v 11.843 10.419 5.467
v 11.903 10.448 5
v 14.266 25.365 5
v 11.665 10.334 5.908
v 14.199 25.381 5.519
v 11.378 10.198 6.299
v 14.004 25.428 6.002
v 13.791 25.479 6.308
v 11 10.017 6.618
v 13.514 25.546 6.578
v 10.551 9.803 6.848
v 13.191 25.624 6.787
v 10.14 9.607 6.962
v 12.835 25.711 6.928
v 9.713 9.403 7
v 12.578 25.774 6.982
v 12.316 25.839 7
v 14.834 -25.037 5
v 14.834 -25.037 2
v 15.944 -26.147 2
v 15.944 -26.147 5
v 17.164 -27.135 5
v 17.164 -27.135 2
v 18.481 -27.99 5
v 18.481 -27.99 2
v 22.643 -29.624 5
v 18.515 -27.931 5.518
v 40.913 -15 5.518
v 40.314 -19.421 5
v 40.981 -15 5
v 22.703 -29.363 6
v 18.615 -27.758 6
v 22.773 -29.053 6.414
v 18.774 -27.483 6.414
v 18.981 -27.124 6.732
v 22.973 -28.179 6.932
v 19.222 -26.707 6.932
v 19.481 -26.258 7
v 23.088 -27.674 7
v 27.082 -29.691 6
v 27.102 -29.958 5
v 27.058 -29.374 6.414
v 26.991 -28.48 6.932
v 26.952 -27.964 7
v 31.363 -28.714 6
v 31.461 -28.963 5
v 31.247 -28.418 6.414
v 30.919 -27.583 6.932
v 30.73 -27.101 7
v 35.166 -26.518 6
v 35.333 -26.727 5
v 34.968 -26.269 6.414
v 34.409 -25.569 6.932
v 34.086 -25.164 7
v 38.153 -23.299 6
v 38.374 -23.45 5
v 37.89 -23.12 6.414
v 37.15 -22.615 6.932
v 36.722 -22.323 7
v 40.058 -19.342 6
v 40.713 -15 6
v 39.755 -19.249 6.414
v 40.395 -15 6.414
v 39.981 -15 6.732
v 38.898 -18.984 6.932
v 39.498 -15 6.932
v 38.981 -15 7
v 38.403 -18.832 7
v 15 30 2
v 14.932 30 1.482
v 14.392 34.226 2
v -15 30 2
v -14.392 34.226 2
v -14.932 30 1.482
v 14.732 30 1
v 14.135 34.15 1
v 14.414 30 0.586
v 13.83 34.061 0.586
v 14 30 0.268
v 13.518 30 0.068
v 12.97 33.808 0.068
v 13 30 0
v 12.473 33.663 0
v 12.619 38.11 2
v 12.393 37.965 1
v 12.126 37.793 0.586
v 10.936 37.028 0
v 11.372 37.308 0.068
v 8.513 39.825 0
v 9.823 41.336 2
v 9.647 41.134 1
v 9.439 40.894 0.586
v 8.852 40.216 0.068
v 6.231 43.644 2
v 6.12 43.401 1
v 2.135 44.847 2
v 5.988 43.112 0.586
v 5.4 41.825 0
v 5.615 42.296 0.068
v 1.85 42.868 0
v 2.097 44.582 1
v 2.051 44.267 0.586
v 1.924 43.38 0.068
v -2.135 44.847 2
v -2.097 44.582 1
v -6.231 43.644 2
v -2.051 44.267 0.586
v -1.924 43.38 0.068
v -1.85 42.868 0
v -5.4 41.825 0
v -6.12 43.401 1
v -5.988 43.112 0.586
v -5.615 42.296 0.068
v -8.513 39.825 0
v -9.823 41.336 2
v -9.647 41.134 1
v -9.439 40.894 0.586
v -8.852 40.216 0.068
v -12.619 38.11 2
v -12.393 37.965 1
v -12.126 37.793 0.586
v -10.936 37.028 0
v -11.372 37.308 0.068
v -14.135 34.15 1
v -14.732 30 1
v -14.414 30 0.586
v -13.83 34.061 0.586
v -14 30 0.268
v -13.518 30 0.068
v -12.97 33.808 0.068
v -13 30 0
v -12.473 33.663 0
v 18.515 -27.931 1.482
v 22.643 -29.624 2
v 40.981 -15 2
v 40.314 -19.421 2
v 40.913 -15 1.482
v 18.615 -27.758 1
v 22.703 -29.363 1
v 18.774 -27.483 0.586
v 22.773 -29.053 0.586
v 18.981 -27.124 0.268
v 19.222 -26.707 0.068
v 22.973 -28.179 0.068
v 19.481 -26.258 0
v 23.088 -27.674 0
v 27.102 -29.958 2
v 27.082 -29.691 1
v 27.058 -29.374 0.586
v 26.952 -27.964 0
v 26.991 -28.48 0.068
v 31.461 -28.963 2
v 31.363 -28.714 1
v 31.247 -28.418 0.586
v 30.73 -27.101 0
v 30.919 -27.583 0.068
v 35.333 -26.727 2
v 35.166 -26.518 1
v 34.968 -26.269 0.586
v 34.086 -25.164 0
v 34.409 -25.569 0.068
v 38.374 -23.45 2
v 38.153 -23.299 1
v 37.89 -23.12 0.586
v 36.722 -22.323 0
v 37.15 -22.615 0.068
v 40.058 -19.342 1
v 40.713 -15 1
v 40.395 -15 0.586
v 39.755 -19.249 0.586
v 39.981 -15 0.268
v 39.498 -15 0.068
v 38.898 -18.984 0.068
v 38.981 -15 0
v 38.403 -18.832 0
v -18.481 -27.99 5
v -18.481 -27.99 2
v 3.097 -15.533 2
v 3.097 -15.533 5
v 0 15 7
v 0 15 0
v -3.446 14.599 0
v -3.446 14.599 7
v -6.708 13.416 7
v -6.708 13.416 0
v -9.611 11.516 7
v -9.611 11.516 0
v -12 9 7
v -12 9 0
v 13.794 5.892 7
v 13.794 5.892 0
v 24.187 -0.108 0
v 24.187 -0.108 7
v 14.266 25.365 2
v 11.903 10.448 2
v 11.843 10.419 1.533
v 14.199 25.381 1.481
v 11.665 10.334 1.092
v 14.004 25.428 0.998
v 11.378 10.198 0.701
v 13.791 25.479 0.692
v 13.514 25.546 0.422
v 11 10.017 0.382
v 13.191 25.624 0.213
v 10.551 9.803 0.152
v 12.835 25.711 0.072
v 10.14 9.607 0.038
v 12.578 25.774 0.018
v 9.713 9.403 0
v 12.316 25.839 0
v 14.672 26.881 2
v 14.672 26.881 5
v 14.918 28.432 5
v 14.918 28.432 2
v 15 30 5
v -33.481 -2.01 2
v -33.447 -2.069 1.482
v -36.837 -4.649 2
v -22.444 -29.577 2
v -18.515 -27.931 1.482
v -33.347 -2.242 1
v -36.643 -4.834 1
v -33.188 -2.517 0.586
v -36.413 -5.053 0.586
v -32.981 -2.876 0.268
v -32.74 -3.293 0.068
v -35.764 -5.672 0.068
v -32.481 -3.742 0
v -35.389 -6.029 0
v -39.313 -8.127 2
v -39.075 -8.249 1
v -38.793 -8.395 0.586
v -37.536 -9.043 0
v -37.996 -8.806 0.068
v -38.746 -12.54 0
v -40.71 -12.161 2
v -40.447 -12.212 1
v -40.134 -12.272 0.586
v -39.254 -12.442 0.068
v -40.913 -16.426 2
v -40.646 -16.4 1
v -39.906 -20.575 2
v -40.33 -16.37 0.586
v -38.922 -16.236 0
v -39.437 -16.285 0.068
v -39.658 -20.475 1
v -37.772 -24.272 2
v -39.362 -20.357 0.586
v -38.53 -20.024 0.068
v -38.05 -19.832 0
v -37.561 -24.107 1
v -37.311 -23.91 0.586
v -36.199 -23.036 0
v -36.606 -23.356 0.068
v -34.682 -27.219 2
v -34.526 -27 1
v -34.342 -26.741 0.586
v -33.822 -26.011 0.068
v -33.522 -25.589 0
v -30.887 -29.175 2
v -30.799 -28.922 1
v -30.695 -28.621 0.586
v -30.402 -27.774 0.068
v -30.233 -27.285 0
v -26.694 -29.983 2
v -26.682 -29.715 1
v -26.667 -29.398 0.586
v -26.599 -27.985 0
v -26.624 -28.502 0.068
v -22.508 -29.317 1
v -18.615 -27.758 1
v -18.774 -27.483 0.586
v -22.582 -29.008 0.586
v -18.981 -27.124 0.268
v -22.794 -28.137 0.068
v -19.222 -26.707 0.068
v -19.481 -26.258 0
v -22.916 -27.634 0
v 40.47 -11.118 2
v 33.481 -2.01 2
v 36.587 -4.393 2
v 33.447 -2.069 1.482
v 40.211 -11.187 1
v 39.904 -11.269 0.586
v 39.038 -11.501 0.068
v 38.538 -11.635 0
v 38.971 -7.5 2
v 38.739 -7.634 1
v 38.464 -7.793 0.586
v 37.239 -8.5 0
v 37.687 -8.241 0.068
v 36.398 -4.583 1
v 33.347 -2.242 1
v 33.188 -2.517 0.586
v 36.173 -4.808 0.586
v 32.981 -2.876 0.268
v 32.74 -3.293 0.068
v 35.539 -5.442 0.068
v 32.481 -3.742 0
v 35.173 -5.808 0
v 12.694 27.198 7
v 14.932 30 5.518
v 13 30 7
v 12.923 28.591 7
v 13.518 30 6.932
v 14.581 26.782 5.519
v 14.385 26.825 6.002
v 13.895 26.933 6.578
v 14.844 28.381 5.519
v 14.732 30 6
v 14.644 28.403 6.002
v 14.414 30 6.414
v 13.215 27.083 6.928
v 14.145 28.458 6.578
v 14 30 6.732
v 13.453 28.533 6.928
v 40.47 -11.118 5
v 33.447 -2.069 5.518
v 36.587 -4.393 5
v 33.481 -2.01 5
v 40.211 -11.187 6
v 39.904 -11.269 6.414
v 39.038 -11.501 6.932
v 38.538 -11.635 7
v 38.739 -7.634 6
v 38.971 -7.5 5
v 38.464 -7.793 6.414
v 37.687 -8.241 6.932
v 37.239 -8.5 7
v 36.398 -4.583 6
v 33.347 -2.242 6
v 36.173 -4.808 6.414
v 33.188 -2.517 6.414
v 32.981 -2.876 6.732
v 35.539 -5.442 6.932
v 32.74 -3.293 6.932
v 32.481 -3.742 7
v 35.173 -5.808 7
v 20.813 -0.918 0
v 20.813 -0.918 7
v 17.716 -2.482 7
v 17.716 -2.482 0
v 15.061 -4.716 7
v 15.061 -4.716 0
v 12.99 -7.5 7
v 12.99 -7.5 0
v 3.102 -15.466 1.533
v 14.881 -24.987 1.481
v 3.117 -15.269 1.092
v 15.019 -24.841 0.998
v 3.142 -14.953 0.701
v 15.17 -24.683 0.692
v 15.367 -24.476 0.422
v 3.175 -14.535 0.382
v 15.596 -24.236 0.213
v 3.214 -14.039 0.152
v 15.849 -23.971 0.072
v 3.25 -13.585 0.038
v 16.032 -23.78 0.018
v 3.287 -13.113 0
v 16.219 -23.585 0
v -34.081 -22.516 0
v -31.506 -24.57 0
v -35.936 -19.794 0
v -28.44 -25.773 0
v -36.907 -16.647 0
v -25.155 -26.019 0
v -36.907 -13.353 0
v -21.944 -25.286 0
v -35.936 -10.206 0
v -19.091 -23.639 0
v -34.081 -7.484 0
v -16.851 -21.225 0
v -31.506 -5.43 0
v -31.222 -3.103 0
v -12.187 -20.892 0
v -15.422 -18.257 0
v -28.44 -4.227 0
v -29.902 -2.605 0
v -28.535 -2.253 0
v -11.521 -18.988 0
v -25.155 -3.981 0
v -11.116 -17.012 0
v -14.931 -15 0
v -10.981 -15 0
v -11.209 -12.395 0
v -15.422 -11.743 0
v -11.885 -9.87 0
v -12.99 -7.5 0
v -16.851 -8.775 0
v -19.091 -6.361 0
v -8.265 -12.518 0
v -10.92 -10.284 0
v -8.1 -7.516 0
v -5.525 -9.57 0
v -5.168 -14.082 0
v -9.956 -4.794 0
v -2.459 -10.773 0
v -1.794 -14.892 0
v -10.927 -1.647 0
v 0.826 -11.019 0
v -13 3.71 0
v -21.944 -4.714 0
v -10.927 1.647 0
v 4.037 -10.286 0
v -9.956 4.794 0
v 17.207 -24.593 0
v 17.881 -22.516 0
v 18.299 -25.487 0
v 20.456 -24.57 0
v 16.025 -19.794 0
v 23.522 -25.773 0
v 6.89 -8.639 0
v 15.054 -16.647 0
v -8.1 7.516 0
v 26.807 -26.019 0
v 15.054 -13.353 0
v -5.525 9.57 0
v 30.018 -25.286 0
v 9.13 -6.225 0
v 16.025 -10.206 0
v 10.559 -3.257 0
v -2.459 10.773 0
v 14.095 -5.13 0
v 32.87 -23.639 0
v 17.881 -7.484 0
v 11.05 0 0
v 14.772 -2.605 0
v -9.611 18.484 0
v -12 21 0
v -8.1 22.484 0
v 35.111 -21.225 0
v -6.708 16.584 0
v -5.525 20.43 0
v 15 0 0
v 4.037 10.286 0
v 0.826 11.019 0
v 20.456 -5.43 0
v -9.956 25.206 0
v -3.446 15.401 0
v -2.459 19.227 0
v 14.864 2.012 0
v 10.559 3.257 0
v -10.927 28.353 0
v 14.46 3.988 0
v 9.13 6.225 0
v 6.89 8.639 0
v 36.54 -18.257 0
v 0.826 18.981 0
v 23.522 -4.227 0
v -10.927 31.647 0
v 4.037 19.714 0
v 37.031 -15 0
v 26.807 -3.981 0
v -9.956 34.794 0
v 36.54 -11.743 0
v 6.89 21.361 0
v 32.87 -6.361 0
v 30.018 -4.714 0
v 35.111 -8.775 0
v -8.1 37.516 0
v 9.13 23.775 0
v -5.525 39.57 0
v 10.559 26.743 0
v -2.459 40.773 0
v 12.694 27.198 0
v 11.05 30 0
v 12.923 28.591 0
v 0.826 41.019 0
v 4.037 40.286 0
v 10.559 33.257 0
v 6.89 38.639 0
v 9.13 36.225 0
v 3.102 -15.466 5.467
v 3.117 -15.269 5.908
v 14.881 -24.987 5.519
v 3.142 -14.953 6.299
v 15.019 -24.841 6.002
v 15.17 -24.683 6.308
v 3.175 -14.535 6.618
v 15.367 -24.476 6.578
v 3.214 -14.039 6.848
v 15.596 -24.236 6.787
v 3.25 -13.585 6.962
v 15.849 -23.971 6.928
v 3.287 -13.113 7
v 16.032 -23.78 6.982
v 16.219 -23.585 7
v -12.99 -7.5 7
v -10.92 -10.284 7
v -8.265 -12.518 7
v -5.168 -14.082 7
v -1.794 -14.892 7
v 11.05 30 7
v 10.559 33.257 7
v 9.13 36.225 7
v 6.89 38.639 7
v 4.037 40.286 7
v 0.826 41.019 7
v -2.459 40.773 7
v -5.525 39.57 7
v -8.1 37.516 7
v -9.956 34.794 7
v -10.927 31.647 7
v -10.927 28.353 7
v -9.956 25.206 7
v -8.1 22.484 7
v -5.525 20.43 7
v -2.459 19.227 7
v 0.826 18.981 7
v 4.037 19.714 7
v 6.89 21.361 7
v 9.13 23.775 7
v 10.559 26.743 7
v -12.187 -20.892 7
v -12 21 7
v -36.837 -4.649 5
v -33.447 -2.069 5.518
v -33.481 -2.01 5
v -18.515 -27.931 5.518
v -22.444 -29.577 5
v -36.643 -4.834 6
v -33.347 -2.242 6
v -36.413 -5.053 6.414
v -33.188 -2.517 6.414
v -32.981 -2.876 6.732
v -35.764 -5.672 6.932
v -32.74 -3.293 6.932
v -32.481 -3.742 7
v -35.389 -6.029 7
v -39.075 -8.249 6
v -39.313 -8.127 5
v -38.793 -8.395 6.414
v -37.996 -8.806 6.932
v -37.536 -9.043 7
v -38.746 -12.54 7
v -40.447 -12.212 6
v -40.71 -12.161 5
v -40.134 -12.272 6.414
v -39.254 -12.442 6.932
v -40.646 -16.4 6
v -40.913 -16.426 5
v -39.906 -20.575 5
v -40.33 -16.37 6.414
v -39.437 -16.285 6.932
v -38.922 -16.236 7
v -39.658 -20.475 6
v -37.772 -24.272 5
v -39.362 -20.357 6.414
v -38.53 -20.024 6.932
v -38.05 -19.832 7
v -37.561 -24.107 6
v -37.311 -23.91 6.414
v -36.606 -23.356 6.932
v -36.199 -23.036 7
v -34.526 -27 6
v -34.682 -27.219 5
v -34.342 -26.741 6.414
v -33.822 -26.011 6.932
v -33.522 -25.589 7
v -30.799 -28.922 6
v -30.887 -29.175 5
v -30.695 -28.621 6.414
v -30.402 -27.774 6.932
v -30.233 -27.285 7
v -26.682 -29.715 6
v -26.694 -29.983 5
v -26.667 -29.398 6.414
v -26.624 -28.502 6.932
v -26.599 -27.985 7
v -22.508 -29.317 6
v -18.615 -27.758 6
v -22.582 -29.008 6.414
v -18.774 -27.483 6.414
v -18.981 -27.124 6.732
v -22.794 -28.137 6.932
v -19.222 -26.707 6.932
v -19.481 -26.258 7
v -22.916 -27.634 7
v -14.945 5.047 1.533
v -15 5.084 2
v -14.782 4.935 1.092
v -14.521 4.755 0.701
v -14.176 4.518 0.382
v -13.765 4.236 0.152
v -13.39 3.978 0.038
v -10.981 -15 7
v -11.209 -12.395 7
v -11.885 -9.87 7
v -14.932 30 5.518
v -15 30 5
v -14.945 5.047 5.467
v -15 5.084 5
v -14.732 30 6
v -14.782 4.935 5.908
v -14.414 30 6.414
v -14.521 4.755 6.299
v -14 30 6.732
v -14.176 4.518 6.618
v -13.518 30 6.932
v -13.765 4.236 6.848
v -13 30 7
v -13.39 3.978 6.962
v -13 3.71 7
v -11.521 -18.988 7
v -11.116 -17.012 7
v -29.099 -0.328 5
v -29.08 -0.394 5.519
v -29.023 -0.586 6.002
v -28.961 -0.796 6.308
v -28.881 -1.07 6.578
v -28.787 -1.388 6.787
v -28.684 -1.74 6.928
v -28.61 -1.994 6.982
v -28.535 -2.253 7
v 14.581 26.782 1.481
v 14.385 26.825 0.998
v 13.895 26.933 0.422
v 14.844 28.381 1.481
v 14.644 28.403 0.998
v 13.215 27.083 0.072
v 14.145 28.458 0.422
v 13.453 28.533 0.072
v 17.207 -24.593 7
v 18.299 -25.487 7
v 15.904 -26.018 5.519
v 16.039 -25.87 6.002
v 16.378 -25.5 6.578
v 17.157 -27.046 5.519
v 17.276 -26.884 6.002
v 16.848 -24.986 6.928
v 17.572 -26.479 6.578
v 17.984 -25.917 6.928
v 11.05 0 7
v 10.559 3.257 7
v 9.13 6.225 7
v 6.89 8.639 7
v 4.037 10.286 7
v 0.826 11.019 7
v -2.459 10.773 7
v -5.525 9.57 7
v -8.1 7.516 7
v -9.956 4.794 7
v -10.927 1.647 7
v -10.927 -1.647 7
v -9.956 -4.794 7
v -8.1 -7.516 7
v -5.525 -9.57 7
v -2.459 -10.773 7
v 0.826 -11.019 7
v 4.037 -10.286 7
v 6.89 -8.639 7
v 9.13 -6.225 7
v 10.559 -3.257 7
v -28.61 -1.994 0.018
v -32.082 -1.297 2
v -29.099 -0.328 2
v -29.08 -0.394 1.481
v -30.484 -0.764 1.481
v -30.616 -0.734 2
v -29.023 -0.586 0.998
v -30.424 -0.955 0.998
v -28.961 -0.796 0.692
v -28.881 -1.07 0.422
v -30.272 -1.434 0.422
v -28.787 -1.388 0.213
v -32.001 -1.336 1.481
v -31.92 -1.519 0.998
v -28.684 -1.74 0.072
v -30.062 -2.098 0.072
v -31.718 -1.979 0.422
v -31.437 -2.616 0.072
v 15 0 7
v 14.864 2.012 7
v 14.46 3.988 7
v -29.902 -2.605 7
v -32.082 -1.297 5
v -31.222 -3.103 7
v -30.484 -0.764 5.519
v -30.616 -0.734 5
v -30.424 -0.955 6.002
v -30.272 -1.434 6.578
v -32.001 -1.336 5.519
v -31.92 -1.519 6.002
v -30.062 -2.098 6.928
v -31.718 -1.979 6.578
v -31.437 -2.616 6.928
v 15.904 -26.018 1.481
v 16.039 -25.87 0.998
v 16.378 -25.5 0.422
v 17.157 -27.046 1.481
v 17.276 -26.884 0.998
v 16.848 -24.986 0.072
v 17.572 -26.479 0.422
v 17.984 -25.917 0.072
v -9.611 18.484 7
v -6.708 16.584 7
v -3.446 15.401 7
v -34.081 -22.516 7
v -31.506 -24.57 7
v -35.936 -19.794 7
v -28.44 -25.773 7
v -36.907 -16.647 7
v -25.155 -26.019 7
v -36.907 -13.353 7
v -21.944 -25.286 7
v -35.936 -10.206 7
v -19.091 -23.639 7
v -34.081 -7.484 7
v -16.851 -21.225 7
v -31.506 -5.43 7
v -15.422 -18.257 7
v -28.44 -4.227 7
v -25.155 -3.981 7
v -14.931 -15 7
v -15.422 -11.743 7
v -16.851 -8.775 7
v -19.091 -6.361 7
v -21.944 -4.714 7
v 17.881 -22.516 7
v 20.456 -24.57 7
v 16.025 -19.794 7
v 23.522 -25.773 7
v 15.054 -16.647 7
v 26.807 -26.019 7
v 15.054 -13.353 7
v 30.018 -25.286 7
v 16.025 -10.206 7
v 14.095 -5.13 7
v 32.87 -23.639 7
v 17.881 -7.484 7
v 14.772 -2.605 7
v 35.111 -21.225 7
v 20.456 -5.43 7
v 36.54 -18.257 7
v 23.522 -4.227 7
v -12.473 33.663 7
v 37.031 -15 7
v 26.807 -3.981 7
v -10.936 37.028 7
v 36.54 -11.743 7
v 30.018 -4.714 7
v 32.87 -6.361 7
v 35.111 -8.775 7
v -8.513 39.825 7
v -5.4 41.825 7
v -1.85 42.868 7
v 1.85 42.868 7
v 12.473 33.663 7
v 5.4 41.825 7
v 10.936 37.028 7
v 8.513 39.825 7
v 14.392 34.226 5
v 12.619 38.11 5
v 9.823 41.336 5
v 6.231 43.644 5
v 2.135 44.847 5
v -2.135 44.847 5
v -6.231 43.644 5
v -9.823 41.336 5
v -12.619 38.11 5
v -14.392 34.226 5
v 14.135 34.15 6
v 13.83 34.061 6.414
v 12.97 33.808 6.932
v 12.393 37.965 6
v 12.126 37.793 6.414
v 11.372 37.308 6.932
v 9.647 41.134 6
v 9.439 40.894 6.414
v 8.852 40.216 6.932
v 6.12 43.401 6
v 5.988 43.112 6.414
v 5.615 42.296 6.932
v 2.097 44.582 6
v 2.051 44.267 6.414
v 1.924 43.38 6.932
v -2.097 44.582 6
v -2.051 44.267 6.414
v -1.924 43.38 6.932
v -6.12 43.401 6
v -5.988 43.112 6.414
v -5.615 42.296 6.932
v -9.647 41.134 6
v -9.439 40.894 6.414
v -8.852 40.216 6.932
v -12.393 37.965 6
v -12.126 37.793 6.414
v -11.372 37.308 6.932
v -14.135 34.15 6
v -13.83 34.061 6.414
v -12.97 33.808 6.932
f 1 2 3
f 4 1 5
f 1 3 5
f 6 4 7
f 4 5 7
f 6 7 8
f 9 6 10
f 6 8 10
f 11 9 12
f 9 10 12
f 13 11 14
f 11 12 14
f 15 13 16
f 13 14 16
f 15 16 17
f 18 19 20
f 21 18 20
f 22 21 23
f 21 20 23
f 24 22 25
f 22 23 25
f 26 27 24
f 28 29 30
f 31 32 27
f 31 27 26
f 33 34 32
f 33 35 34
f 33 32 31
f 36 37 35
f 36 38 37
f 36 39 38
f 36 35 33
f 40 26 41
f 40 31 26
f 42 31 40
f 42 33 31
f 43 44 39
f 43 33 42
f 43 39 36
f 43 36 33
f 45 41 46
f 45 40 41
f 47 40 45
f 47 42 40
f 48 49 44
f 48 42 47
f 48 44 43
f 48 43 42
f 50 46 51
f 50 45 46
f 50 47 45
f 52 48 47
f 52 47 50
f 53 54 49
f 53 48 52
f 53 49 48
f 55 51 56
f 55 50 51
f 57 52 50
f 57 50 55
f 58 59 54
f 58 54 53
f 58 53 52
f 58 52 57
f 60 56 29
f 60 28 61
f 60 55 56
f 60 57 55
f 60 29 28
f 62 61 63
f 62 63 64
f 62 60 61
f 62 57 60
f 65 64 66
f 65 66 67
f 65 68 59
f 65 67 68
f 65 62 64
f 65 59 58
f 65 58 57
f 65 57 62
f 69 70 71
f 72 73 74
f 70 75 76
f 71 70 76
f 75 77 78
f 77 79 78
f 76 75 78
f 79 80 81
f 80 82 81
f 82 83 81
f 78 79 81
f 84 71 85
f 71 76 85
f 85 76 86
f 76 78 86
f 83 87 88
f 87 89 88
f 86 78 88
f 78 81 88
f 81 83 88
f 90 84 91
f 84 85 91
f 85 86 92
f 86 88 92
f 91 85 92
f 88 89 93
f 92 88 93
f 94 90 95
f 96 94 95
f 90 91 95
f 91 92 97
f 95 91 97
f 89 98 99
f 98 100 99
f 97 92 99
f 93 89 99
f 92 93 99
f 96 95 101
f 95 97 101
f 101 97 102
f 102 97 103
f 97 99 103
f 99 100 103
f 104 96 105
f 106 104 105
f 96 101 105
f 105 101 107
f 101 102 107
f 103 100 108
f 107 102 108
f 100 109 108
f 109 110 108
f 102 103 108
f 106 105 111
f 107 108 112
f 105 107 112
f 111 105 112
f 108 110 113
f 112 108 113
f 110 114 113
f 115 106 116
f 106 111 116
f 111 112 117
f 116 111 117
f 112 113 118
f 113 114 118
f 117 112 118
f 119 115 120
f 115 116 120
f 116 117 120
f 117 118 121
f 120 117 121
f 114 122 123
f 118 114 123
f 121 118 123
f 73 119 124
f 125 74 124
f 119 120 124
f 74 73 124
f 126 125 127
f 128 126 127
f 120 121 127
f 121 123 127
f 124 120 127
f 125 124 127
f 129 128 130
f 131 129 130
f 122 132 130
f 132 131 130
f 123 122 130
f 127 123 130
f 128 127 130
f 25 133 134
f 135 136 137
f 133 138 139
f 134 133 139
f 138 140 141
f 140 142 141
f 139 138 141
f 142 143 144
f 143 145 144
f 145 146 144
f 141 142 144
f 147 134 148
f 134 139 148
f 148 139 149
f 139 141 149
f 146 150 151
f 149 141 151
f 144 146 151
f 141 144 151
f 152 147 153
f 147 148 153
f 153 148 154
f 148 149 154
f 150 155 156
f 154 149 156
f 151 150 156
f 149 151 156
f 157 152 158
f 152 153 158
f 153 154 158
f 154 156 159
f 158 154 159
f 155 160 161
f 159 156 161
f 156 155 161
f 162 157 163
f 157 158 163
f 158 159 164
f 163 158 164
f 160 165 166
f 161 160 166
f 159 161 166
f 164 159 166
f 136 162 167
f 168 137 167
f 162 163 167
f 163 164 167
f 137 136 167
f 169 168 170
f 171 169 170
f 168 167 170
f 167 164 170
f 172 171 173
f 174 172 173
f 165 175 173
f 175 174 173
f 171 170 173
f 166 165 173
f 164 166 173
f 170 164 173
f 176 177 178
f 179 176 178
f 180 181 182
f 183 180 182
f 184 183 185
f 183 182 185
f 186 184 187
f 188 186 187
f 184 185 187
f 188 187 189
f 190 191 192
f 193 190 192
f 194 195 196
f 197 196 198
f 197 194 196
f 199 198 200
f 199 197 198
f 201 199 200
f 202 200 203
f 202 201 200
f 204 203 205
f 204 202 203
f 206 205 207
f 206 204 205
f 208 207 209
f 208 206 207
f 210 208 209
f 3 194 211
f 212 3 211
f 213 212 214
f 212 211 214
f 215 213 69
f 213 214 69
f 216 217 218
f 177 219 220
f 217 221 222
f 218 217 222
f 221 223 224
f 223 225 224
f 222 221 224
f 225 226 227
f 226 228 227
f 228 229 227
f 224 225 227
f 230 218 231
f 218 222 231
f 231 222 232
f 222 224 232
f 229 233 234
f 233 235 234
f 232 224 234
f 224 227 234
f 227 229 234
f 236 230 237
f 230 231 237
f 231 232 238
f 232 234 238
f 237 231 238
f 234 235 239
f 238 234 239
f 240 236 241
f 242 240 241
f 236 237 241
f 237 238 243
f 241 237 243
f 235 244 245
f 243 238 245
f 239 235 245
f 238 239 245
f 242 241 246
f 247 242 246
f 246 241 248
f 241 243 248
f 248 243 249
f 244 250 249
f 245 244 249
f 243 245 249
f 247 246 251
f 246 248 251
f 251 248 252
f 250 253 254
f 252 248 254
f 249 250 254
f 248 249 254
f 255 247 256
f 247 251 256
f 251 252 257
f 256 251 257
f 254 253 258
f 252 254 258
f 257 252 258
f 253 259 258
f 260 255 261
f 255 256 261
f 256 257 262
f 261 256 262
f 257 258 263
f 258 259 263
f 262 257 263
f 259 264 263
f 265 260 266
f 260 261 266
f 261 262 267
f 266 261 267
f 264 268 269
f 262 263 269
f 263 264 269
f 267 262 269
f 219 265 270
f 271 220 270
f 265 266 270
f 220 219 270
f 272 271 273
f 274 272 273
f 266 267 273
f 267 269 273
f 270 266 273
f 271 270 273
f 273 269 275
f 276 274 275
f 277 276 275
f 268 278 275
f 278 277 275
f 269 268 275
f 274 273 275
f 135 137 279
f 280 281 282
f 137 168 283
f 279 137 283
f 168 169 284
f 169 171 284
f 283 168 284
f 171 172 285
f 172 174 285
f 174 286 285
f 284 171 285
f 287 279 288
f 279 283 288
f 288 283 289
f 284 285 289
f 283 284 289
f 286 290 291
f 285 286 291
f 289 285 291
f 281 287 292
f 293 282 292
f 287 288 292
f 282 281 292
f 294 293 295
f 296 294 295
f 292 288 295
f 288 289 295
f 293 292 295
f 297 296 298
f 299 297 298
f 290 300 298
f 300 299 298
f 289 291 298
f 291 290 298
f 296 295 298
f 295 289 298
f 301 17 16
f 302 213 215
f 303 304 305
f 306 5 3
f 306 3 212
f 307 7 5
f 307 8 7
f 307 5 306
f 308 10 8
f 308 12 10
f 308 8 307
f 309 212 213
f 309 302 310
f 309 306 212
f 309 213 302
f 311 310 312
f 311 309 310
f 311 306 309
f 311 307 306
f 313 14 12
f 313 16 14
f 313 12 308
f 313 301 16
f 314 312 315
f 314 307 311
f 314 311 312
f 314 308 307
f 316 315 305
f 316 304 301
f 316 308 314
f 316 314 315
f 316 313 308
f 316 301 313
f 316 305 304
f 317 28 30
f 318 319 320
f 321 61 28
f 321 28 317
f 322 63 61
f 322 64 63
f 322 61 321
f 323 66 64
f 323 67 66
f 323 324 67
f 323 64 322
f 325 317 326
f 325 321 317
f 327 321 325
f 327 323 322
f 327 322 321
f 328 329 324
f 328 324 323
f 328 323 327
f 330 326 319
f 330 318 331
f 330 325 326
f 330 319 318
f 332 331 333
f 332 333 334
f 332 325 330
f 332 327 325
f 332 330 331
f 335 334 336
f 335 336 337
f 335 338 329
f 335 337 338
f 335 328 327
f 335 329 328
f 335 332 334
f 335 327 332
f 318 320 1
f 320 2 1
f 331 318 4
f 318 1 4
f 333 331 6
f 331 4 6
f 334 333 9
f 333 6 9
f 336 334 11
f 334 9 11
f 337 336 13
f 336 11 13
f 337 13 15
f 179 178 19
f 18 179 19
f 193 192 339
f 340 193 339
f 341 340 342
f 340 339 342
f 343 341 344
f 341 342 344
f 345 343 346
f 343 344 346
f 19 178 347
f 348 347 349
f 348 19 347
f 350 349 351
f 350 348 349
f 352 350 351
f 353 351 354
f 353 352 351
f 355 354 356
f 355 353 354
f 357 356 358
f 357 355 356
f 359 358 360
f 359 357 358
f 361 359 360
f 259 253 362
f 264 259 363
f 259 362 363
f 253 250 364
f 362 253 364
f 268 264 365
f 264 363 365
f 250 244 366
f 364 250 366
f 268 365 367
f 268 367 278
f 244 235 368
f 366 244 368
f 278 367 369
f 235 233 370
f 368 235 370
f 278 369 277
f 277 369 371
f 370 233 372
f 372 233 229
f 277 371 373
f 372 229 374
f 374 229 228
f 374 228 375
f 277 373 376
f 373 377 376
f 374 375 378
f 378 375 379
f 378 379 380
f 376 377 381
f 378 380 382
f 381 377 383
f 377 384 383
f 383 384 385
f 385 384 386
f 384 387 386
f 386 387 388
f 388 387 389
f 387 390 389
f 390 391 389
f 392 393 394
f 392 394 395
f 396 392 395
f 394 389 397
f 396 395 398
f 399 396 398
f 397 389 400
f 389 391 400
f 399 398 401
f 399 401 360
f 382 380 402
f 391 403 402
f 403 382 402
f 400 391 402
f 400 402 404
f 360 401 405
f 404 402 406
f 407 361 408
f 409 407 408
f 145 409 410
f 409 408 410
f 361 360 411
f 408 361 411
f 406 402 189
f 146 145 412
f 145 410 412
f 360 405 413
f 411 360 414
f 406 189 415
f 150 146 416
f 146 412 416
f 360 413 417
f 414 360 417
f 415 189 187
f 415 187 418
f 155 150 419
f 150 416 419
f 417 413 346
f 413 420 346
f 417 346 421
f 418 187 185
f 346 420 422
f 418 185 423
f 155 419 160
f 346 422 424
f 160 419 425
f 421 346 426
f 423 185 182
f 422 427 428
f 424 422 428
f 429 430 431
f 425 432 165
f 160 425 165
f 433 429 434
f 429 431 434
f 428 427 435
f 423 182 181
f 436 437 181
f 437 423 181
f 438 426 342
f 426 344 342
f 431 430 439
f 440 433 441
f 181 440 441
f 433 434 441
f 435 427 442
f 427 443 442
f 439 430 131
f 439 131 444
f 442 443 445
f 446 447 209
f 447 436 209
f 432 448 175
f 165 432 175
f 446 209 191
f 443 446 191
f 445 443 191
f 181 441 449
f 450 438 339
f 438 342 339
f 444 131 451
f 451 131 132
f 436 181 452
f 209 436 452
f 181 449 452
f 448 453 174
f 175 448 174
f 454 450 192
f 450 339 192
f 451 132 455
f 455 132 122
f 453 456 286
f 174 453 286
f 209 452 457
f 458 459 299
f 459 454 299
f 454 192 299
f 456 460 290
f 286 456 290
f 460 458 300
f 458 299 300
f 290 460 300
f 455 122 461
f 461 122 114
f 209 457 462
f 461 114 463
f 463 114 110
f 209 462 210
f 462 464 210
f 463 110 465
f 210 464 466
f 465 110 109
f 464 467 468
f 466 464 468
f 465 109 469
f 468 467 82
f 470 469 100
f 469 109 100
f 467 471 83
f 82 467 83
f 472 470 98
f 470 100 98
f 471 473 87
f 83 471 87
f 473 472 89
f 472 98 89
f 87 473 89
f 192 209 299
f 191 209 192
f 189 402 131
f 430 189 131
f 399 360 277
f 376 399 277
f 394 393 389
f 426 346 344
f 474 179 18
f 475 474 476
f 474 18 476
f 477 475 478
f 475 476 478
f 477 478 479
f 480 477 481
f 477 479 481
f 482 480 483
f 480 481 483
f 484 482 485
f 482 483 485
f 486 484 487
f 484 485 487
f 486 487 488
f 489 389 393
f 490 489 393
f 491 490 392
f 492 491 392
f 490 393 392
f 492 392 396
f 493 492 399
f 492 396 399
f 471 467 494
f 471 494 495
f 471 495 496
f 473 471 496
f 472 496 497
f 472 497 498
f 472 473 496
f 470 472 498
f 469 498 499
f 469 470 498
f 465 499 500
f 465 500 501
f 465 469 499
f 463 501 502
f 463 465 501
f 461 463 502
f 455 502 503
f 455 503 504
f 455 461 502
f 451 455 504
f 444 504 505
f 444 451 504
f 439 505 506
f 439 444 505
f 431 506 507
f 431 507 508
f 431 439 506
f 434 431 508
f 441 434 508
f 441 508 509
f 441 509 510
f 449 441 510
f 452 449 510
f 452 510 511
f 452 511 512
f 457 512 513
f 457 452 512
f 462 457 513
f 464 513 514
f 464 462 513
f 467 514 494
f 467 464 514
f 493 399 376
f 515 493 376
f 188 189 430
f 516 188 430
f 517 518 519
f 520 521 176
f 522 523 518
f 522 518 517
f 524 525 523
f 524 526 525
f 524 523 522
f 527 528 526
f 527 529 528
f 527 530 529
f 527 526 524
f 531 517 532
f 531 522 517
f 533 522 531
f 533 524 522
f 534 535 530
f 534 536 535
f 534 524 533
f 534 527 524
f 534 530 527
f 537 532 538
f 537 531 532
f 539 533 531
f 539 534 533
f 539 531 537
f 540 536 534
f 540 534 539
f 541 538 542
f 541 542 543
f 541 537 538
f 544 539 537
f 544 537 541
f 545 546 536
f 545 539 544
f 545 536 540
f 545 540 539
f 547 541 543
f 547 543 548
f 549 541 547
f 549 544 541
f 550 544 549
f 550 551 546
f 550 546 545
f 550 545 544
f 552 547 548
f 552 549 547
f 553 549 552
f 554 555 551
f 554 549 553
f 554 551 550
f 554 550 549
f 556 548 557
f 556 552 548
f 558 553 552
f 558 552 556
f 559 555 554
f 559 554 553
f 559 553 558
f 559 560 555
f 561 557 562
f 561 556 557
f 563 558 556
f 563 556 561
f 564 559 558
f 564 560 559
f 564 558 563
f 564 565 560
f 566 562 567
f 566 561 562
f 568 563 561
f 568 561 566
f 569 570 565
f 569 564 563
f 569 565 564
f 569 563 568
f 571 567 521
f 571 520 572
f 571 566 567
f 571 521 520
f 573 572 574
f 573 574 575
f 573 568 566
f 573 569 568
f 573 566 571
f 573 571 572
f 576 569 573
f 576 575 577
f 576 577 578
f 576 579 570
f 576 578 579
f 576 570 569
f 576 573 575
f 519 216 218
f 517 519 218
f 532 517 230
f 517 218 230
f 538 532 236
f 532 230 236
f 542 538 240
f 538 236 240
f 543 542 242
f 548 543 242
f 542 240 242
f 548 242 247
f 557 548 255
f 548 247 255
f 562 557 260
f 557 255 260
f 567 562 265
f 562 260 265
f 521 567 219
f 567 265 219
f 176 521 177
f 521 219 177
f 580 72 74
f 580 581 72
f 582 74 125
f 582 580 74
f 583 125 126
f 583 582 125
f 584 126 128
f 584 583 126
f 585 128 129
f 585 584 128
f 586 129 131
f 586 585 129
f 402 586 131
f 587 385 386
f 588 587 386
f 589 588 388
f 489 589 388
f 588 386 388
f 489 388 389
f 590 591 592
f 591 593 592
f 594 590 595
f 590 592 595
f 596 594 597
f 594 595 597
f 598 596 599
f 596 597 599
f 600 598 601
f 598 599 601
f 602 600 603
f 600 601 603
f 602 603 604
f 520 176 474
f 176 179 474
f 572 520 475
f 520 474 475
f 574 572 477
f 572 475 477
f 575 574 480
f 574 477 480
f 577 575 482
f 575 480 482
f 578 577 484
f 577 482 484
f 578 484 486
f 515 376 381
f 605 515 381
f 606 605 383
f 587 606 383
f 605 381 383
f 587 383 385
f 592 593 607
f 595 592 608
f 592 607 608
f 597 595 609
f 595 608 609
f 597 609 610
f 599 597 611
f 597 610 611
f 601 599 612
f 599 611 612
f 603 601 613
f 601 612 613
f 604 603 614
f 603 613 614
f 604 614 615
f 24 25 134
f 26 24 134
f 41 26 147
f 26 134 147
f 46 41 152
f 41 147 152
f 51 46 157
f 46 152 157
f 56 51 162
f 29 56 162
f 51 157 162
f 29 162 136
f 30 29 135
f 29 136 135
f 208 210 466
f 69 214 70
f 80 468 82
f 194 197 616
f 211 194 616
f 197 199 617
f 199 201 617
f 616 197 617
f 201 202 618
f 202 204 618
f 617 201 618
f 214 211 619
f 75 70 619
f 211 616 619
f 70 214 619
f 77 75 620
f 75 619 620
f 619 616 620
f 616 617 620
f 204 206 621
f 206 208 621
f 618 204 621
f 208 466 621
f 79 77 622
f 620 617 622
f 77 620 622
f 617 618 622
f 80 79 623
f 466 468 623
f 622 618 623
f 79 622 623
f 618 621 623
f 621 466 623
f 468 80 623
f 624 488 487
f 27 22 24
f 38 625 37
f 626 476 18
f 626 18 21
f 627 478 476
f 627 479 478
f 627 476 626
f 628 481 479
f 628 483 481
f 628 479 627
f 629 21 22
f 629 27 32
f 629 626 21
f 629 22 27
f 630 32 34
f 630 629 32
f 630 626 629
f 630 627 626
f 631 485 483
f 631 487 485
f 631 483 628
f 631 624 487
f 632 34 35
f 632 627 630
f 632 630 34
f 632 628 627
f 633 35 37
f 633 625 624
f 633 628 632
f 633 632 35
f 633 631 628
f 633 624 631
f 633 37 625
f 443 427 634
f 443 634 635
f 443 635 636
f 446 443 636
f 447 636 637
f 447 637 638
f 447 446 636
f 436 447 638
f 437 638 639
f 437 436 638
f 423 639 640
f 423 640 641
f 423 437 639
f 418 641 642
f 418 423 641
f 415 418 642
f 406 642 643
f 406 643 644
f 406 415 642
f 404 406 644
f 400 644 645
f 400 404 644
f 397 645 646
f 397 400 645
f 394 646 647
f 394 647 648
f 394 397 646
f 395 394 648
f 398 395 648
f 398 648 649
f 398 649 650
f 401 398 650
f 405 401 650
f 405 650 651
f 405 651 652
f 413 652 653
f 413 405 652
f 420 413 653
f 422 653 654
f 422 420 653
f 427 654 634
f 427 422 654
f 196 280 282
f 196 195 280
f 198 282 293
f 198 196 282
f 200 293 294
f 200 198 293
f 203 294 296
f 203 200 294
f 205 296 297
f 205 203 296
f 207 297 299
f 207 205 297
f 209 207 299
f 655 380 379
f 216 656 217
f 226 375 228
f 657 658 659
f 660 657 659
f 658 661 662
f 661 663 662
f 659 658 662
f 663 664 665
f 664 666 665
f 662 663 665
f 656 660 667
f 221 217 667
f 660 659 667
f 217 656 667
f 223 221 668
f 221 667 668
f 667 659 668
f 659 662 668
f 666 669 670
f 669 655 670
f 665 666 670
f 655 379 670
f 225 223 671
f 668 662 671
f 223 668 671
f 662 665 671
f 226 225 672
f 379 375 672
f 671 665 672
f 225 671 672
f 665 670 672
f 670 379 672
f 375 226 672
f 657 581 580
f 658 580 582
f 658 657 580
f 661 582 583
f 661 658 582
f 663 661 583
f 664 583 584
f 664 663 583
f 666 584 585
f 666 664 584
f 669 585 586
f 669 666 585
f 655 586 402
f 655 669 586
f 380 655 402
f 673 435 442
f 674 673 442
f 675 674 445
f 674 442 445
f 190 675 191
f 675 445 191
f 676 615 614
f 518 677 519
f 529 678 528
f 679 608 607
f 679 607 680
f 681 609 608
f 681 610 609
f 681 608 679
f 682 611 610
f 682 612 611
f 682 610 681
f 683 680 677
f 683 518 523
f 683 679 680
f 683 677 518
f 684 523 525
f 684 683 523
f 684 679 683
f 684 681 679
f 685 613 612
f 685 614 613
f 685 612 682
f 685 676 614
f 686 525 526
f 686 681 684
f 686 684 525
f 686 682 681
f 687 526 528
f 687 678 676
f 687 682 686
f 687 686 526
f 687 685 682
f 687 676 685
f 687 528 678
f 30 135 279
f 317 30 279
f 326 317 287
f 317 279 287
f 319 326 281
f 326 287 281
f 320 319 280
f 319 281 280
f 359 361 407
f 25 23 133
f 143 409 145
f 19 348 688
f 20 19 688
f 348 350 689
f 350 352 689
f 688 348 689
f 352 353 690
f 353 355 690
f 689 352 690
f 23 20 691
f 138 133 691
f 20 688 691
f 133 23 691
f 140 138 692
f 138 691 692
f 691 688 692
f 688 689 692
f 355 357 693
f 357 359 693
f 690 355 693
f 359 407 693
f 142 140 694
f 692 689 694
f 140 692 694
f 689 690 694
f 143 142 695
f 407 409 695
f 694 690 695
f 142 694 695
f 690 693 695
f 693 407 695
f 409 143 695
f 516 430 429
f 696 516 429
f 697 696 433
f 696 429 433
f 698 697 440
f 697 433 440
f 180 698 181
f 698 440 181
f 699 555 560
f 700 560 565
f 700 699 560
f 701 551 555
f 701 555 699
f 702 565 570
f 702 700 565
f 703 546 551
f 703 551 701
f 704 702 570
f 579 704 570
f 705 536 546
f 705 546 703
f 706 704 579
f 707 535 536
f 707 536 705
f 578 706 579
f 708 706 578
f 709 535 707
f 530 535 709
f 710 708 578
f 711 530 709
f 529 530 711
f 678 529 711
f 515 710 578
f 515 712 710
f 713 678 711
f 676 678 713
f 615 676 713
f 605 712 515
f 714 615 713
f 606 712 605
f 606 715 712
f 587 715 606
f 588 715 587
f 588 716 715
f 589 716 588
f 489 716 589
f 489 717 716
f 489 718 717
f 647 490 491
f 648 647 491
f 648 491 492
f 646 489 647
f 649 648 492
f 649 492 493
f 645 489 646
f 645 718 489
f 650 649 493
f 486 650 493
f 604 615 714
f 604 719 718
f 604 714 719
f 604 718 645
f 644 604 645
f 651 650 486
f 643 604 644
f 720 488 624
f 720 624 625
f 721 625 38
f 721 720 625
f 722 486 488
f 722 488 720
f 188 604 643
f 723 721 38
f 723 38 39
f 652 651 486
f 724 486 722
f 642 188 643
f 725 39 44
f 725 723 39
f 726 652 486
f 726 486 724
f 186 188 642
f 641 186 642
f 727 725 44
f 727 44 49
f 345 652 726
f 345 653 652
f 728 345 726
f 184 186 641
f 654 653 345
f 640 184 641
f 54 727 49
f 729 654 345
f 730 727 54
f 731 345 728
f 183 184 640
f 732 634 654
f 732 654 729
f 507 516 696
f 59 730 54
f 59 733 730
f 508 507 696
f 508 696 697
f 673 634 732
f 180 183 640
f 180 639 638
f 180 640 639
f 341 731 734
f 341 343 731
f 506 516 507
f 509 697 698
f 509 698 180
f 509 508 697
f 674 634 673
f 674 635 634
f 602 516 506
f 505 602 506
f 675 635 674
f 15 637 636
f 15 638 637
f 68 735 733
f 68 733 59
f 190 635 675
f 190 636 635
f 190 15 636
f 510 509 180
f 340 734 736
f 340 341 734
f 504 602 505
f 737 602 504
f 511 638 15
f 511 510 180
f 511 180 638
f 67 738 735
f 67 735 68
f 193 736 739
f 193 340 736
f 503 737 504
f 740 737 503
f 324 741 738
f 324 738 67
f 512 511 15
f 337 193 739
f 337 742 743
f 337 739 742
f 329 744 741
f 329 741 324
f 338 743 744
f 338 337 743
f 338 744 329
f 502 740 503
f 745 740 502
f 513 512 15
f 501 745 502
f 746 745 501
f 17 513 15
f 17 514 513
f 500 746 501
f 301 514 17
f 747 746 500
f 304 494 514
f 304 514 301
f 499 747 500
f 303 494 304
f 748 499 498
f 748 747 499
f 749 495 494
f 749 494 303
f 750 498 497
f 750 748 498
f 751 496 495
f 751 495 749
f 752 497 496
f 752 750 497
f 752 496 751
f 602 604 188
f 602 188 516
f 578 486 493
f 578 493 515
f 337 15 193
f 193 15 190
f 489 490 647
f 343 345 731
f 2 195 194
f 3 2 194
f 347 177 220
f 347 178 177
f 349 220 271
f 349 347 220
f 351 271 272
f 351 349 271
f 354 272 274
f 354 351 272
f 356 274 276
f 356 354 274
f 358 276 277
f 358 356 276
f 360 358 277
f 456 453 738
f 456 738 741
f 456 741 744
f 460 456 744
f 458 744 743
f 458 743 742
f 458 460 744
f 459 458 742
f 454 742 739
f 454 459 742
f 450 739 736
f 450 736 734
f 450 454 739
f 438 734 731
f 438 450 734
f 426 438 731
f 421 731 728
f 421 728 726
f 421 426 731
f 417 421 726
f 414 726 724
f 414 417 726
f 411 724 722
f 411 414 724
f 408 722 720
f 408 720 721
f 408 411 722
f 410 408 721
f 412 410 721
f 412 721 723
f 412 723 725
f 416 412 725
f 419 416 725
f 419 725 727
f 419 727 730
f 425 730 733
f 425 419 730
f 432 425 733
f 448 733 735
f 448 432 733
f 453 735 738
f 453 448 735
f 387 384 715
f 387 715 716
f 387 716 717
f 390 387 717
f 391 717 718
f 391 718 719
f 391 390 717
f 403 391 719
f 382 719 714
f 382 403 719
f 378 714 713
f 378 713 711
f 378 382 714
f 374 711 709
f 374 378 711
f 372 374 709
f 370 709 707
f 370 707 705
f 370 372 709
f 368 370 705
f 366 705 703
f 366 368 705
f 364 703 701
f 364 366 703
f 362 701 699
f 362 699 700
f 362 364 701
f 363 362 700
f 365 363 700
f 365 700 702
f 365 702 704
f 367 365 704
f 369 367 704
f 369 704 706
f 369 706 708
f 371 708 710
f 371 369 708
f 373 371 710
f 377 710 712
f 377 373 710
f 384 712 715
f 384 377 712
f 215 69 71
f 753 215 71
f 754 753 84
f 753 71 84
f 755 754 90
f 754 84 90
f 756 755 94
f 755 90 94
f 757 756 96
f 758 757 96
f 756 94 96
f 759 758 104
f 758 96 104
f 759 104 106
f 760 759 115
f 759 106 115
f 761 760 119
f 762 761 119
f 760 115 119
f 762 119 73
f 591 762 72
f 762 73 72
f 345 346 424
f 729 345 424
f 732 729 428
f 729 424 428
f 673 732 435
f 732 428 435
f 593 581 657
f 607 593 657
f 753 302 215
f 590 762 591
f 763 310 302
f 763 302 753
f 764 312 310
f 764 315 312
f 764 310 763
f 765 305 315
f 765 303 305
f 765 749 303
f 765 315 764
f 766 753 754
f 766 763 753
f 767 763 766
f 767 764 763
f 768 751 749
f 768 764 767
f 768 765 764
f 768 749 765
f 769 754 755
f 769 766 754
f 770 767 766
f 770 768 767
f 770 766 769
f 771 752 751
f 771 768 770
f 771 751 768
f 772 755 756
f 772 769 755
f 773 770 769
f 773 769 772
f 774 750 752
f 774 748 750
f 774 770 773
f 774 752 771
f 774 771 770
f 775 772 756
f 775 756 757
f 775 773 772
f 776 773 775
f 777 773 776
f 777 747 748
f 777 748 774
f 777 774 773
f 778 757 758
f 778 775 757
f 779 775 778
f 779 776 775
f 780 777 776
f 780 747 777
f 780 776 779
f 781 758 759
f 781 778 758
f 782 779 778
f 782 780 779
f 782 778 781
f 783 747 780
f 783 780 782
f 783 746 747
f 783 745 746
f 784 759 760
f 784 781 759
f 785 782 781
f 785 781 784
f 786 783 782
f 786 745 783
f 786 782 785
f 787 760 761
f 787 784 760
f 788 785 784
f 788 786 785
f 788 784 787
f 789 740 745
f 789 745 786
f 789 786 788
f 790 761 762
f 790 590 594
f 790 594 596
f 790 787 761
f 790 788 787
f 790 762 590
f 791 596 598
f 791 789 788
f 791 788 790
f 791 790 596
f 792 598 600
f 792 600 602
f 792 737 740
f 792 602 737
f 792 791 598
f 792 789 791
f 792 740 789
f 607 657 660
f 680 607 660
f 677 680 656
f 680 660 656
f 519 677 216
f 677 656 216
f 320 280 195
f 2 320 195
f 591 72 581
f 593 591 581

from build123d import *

# Parameters (mm, degrees)
F0_R     = 11.05
F1_DEPTH = 7
F2_R     = 2


with BuildPart() as f1:
    # F0 (on Top) → F1 (new body)
    with BuildSketch(Plane.XY):
        with BuildLine():
            ThreePointArc((7.5, 12.9903810568), (11.2230439167, 9.9520492987), (13.7942286341, 5.8923048454))
            Line((13.7942286341, 5.8923048454), (24.1865334795, -0.1076951546))
            ThreePointArc((24.1865334795, -0.1076951546), (28.9879676676, -0.304534211), (33.4807621135, -2.0096189432))
            Line((33.4807621135, -2.0096189432), (11.903289687, 10.4481405707))
            Line((11.903289687, 10.4481405707), (7.5, 12.9903810568))
        make_face()
        with BuildLine():
            ThreePointArc((14.8335897314, -25.0369590954), (11.0629336807, -16.5679269269), (12.990381079, -7.4999999614))
            ThreePointArc((12.990381079, -7.4999999614), (10.6066017336, -10.606601702), (7.5, -12.9903810568))
            Line((7.5, -12.9903810568), (3.096710313, -15.5326215429))
            Line((3.096710313, -15.5326215429), (14.8335897314, -25.0369590954))
        make_face()
        with BuildLine():
            ThreePointArc((24.1865334795, -0.1076951546), (17.7159140598, -2.4823210359), (12.990381079, -7.4999999614))
            ThreePointArc((12.990381079, -7.4999999614), (11.0629336807, -16.5679269269), (14.8335897314, -25.0369590954))
            Line((14.8335897314, -25.0369590954), (18.4807621135, -27.9903810568))
            ThreePointArc((18.4807621135, -27.9903810568), (33.4807621135, -27.9903810568), (40.9807621135, -15))
            ThreePointArc((40.9807621135, -15), (38.9711431703, -7.5), (33.4807621135, -2.0096189432))
            ThreePointArc((33.4807621135, -2.0096189432), (28.9879676676, -0.304534211), (24.1865334795, -0.1076951546))
        make_face()
        with Locations((25.9807621135, -15)):
            Circle(F0_R, mode=Mode.SUBTRACT)
        with BuildLine():
            ThreePointArc((0, 15), (3.8822856765, 14.4888873943), (7.5, 12.9903810568))
            Line((7.5, 12.9903810568), (11.903289687, 10.4481405707))
            Line((11.903289687, 10.4481405707), (14.2658477444, 25.3647450844))
            ThreePointArc((14.2658477444, 25.3647450844), (8.8167787844, 17.8647450844), (0, 15))
        make_face()
        with BuildLine():
            Line((3.096710313, -15.5326215429), (7.5, -12.9903810568))
            ThreePointArc((7.5, -12.9903810568), (3.0072055541, -14.695465789), (-1.7942286341, -14.8923048454))
            Line((-1.7942286341, -14.8923048454), (-12.1865334795, -20.8923048454))
            ThreePointArc((-12.1865334795, -20.8923048454), (-14.7577181969, -24.9520492987), (-18.4807621135, -27.9903810568))
            Line((-18.4807621135, -27.9903810568), (3.096710313, -15.5326215429))
        make_face()
        with BuildLine():
            Line((18.4807621135, -27.9903810568), (14.8335897314, -25.0369590954))
            ThreePointArc((14.8335897314, -25.0369590954), (16.5409562478, -26.6571894219), (18.4807621135, -27.9903810568))
        make_face()
        with BuildLine():
            ThreePointArc((-12, 21), (-6.7082039325, 16.583592135), (0, 15))
            ThreePointArc((0, 15), (8.8167787844, 17.8647450844), (14.2658477444, 25.3647450844))
            Line((14.2658477444, 25.3647450844), (15, 30))
            ThreePointArc((15, 30), (0, 45), (-15, 30))
            ThreePointArc((-15, 30), (-14.2302494708, 25.2565835097), (-12, 21))
        make_face()
        with Locations((0, 30)):
            Circle(F0_R, mode=Mode.SUBTRACT)
        with BuildLine():
            ThreePointArc((-15, 0), (-14.2302494708, 4.7434164903), (-12, 9))
            Line((-12, 9), (-12, 21))
            ThreePointArc((-12, 21), (-14.2302494708, 25.2565835097), (-15, 30))
            Line((-15, 30), (-15, 5.0844809722))
            Line((-15, 5.0844809722), (-15, 0))
        make_face()
        with BuildLine():
            Line((15, 30), (14.2658477444, 25.3647450844))
            ThreePointArc((14.2658477444, 25.3647450844), (14.8153251089, 27.6534830244), (15, 30))
        make_face()
        with BuildLine():
            ThreePointArc((-29.0994374758, -0.327785989), (-19.8797124097, -1.2968181611), (-12.9903809936, -7.5000001095))
            ThreePointArc((-12.9903809936, -7.5000001095), (-14.488887378, -3.8822857376), (-15, 0))
            Line((-15, 0), (-15, 5.0844809722))
            Line((-15, 5.0844809722), (-29.0994374758, -0.327785989))
        make_face()
        with BuildLine():
            ThreePointArc((-10.9807621135, -15), (-11.4918747028, -11.1177143845), (-12.9903809936, -7.5000001095))
            ThreePointArc((-12.9903809936, -7.5000001095), (-19.8797124097, -1.2968181611), (-29.0994374758, -0.327785989))
            Line((-29.0994374758, -0.327785989), (-33.4807621135, -2.0096189432))
            ThreePointArc((-33.4807621135, -2.0096189432), (-38.9711431703, -22.5), (-18.4807621135, -27.9903810568))
            ThreePointArc((-18.4807621135, -27.9903810568), (-14.7577181969, -24.9520492987), (-12.1865334795, -20.8923048454))
            ThreePointArc((-12.1865334795, -20.8923048454), (-11.2852963245, -18.0072055541), (-10.9807621135, -15))
        make_face()
        with Locations((-25.9807621135, -15)):
            Circle(F0_R, mode=Mode.SUBTRACT)
        with BuildLine():
            Line((-33.4807621135, -2.0096189432), (-29.0994374758, -0.327785989))
            ThreePointArc((-29.0994374758, -0.327785989), (-31.3562813567, -0.9962936025), (-33.4807621135, -2.0096189432))
        make_face()
        with BuildLine():
            ThreePointArc((12.990381079, -7.4999999614), (14.4888874001, -3.882285655), (15, 0))
            ThreePointArc((15, 0), (14.695465789, 3.0072055541), (13.7942286341, 5.8923048454))
            ThreePointArc((13.7942286341, 5.8923048454), (11.2230439167, 9.9520492987), (7.5, 12.9903810568))
            ThreePointArc((7.5, 12.9903810568), (3.8822856765, 14.4888873943), (0, 15))
            ThreePointArc((0, 15), (-6.7082039325, 13.416407865), (-12, 9))
            ThreePointArc((-12, 9), (-14.2302494708, 4.7434164903), (-15, 0))
            ThreePointArc((-15, 0), (-14.488887378, -3.8822857376), (-12.9903809936, -7.5000001095))
            ThreePointArc((-12.9903809936, -7.5000001095), (-8.2648480196, -12.5176789866), (-1.7942286341, -14.8923048454))
            ThreePointArc((-1.7942286341, -14.8923048454), (3.0072055541, -14.695465789), (7.5, -12.9903810568))
            ThreePointArc((7.5, -12.9903810568), (10.6066017336, -10.606601702), (12.990381079, -7.4999999614))
        make_face()
        Circle(F0_R, mode=Mode.SUBTRACT)
    extrude(amount=F1_DEPTH)

    # F2
    f2_edges = [f1.edges().sort_by_distance(p)[0] for p in [
        (22.692026, 4.219261, 0),
        (37.637952, -24.439806, 0),
        (8.96515, -20.28479, 0),
        (-7.692026, -21.761501, 0),
        (-22.049719, 2.378347, 0),
        (-15, 17.54224, 0),
        (13.084569, 17.906443, 0),
        (-15, 17.54224, 7),
        (-22.049719, 2.378347, 7),
        (-7.692026, -21.761501, 7),
        (8.96515, -20.28479, 7),
        (22.692026, 4.219261, 7),
        (13.084569, 17.906443, 7),
    ]]
    fillet(f2_edges, radius=F2_R)


solid = f1.part
